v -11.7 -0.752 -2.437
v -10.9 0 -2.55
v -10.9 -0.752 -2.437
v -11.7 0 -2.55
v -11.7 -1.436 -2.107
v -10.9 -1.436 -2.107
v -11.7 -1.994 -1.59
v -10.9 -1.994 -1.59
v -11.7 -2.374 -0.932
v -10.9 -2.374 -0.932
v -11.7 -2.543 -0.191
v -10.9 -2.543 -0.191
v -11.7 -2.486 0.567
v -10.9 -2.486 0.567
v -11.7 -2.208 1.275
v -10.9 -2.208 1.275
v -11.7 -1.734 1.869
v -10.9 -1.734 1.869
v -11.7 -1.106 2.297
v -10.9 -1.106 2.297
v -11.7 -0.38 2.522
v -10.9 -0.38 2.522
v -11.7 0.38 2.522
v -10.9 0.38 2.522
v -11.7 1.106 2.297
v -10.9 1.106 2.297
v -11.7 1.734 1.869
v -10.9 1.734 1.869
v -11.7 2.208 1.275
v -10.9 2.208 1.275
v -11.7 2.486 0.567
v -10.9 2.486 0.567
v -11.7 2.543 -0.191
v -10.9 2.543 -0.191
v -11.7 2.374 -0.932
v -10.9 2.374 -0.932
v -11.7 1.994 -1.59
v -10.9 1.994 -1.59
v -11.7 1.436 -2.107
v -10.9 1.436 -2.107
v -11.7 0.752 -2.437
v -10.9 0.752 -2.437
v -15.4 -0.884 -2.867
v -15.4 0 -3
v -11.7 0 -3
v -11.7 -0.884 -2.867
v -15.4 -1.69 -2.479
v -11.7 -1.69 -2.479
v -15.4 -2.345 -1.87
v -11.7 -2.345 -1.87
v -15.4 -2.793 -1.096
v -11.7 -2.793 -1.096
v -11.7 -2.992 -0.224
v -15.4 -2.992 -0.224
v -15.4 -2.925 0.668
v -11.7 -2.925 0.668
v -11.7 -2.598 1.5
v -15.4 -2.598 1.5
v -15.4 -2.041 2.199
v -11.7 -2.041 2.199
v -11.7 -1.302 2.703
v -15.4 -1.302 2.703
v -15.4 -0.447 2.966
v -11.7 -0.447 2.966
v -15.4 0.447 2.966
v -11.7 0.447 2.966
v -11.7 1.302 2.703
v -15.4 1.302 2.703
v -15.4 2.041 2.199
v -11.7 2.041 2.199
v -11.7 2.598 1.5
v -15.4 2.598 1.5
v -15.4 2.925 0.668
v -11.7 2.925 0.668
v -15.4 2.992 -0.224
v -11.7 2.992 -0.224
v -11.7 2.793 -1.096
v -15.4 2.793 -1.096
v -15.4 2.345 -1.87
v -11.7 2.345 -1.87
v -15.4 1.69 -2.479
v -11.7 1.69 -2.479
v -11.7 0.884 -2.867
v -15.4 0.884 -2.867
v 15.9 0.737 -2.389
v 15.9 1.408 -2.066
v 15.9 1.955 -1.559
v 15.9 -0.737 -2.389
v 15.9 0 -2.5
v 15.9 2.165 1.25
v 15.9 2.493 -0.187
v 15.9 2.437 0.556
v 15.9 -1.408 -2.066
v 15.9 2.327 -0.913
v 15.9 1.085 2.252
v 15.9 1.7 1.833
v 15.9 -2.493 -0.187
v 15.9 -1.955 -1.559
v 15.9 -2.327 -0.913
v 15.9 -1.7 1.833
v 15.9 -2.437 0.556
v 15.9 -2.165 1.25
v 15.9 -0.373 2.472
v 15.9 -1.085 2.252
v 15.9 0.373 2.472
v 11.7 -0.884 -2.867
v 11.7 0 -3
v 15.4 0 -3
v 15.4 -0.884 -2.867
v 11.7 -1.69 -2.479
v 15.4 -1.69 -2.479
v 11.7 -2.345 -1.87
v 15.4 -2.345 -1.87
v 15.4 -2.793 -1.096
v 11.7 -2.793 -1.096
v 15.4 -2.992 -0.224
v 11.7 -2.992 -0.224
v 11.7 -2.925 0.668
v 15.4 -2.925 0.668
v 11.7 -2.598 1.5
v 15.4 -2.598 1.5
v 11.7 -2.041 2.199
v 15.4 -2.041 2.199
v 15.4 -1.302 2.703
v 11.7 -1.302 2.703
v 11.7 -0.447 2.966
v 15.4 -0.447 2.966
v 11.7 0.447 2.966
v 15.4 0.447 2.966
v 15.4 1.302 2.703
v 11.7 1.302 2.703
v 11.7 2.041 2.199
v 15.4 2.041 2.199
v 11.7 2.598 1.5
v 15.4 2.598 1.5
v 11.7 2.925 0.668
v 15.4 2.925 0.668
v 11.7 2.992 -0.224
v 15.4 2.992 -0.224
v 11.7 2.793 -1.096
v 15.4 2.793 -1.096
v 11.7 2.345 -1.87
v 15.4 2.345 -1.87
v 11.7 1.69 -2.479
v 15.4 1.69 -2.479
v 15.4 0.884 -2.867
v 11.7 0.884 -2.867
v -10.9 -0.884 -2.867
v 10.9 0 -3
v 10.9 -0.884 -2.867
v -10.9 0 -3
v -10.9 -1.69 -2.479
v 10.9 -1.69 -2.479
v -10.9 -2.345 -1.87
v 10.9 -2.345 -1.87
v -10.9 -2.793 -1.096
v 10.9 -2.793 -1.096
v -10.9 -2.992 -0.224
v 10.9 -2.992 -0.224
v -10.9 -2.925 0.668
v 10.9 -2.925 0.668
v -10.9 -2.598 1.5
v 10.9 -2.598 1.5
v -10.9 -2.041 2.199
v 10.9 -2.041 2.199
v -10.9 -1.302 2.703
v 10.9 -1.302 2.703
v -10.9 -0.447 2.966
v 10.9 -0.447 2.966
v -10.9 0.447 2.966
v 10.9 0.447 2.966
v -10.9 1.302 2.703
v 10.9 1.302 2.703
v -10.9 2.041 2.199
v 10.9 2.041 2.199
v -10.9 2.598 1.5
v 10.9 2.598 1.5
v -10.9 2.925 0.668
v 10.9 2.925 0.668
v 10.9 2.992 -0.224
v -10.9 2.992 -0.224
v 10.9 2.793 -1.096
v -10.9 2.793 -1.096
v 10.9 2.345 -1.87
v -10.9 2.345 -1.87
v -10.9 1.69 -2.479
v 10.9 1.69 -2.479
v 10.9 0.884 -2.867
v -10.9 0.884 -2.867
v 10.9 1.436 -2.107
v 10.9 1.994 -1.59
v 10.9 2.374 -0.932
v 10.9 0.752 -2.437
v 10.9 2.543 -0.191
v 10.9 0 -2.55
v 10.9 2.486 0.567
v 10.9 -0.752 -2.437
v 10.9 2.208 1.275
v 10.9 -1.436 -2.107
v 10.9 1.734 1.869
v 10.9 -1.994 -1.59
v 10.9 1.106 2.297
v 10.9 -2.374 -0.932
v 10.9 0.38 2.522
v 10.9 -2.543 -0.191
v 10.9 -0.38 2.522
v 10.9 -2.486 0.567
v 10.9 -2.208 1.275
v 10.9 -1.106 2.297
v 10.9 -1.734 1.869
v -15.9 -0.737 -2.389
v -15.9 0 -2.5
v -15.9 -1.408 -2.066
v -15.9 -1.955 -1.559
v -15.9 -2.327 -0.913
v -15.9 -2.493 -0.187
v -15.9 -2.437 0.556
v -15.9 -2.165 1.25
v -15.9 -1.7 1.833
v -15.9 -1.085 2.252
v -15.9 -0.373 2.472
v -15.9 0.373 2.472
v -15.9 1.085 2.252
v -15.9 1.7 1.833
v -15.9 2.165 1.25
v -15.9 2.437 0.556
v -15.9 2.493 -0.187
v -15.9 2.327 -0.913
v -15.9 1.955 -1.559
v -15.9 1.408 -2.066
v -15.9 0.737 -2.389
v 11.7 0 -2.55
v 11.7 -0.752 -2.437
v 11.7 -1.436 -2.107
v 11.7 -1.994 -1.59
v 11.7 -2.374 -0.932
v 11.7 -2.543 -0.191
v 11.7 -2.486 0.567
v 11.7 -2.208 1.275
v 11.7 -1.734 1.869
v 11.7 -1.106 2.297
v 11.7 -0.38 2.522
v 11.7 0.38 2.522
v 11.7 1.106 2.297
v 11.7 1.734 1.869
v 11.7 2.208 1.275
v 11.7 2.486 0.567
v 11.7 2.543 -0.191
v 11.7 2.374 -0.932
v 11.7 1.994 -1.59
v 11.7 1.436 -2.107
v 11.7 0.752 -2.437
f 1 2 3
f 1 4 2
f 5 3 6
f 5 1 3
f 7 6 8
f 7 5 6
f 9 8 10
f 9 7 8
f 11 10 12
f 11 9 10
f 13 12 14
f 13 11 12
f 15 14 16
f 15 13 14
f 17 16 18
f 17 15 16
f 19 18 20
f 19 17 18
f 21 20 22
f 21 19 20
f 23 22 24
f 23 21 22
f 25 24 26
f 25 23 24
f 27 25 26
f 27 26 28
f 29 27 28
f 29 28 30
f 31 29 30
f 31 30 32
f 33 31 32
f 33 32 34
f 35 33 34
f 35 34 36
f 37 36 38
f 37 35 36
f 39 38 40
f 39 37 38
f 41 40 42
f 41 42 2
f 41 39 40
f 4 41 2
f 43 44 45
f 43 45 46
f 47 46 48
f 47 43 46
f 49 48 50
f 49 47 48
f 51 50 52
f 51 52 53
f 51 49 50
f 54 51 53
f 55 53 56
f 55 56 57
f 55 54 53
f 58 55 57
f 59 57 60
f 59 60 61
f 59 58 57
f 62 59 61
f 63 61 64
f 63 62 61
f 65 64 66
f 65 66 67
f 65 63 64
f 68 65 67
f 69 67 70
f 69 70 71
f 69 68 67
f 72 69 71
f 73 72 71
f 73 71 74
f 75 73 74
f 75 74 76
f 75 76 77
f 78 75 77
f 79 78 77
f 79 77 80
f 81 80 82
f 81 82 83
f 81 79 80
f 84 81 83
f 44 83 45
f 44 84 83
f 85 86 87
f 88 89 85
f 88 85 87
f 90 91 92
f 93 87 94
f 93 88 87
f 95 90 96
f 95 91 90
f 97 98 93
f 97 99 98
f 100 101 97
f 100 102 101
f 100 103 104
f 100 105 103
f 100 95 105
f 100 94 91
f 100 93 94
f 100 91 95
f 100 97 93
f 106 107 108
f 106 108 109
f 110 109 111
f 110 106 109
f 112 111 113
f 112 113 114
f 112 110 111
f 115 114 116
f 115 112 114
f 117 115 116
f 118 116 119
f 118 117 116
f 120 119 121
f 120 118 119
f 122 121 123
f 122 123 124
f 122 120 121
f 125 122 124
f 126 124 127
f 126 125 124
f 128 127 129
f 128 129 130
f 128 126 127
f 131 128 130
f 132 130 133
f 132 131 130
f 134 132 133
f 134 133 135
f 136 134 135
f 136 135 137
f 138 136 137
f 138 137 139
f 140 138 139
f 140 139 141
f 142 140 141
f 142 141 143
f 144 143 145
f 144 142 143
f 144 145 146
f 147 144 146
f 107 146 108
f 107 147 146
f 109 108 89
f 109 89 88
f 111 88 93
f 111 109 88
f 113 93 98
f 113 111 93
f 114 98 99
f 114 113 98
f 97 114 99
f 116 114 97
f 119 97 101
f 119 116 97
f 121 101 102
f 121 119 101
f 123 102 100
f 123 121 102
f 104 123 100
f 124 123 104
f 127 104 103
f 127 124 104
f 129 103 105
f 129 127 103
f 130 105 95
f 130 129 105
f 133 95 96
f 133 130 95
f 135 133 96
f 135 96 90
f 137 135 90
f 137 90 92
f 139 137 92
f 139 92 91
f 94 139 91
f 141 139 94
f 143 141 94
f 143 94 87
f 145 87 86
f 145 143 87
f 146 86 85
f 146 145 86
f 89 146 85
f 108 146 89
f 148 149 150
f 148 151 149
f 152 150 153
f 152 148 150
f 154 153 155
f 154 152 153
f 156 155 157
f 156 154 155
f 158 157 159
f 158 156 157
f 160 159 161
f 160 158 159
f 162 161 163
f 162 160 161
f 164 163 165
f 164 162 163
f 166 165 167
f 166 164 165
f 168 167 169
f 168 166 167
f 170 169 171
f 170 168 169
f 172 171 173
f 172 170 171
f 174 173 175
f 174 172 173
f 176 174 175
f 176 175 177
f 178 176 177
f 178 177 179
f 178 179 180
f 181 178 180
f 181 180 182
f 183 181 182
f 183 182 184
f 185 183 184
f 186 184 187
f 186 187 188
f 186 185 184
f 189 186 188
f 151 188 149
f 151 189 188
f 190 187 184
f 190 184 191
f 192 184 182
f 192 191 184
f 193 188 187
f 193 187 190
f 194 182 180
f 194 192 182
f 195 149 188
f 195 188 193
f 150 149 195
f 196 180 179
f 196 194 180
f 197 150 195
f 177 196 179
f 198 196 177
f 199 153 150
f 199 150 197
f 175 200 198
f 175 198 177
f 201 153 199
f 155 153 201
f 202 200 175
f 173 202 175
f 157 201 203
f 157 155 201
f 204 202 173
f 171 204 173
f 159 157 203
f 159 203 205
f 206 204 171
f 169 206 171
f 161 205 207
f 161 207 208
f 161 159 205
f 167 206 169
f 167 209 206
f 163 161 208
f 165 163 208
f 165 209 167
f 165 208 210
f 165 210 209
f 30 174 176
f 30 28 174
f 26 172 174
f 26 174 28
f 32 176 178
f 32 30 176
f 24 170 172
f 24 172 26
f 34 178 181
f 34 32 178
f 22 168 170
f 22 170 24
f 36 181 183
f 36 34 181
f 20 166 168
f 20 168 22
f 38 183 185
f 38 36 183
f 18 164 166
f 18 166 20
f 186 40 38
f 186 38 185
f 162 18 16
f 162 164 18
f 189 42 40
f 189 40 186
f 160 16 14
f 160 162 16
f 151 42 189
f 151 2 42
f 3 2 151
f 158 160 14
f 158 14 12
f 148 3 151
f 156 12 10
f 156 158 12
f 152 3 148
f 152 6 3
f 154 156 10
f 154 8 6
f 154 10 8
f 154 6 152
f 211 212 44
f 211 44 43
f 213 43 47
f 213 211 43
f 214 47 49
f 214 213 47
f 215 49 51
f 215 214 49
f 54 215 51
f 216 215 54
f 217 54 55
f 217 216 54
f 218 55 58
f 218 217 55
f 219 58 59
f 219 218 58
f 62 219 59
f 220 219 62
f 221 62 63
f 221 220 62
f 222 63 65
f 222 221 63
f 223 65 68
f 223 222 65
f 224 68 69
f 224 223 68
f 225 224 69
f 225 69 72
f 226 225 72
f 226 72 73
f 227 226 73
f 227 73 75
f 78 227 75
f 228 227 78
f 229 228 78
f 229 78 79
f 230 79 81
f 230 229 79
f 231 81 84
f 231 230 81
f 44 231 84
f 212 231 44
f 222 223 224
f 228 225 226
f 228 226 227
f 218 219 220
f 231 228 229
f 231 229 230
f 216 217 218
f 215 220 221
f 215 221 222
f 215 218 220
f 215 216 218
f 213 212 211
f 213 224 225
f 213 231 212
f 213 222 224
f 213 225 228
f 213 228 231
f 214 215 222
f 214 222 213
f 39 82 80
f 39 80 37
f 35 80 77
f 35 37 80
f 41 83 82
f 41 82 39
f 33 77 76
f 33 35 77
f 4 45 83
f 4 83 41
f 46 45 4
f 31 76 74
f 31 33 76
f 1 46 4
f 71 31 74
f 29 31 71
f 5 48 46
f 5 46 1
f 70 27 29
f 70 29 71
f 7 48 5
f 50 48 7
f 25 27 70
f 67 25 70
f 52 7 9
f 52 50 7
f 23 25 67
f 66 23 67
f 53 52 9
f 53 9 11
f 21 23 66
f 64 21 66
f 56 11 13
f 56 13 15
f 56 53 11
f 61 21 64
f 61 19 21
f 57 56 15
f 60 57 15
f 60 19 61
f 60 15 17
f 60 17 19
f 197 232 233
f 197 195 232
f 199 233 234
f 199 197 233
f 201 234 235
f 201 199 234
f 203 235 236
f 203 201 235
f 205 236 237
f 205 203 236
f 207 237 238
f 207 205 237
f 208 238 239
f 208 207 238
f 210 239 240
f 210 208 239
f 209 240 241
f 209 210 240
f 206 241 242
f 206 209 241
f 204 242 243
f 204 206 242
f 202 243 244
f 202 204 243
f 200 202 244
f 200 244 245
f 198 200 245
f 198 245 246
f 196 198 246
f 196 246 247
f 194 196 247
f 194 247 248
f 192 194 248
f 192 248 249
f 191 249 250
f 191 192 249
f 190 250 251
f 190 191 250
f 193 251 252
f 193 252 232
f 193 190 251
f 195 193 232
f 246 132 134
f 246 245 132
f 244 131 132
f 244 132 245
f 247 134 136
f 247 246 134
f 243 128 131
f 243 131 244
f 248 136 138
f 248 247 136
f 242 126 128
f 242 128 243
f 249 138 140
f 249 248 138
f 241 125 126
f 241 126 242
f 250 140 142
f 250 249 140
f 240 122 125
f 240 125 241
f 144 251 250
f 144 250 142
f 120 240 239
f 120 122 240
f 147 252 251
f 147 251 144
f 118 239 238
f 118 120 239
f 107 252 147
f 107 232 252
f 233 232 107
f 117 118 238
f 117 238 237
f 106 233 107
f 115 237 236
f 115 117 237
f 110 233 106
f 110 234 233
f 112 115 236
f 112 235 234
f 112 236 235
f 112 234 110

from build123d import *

# Parameters (mm, degrees)
CHAFL_N1_SIZE = 0.5


with BuildPart() as part:
    # Croquis1 → Revolución1 (revolve)
    with BuildSketch(Plane(origin=(0, 0, 0), x_dir=(-1, 0, 0), z_dir=(0, 1, 0)), mode=Mode.PRIVATE) as revoluci_n1_sk:
        Polygon((-10.9, 3), (10.9, 3), (10.9, 2.55), (11.7, 2.55), (11.7, 3), (15.9, 3), (15.9, 0), (-15.9, 0), (-15.9, 3), (-11.7, 3), (-11.7, 2.55), (-10.9, 2.55), align=None)
    revolve(revoluci_n1_sk.sketch.rotate(Axis((15.9, 0, 0), (-1, 0, 0)), 180), axis=Axis((15.9, 0, 0), (-1, 0, 0)))

    # Chaflán1
    chafl_n1_edges = [part.edges().sort_by_distance(p)[0] for p in [
        (-15.9, 0, 3),
        (15.9, 0, 3),
    ]]
    chamfer(chafl_n1_edges, length=CHAFL_N1_SIZE)


solid = part.part
